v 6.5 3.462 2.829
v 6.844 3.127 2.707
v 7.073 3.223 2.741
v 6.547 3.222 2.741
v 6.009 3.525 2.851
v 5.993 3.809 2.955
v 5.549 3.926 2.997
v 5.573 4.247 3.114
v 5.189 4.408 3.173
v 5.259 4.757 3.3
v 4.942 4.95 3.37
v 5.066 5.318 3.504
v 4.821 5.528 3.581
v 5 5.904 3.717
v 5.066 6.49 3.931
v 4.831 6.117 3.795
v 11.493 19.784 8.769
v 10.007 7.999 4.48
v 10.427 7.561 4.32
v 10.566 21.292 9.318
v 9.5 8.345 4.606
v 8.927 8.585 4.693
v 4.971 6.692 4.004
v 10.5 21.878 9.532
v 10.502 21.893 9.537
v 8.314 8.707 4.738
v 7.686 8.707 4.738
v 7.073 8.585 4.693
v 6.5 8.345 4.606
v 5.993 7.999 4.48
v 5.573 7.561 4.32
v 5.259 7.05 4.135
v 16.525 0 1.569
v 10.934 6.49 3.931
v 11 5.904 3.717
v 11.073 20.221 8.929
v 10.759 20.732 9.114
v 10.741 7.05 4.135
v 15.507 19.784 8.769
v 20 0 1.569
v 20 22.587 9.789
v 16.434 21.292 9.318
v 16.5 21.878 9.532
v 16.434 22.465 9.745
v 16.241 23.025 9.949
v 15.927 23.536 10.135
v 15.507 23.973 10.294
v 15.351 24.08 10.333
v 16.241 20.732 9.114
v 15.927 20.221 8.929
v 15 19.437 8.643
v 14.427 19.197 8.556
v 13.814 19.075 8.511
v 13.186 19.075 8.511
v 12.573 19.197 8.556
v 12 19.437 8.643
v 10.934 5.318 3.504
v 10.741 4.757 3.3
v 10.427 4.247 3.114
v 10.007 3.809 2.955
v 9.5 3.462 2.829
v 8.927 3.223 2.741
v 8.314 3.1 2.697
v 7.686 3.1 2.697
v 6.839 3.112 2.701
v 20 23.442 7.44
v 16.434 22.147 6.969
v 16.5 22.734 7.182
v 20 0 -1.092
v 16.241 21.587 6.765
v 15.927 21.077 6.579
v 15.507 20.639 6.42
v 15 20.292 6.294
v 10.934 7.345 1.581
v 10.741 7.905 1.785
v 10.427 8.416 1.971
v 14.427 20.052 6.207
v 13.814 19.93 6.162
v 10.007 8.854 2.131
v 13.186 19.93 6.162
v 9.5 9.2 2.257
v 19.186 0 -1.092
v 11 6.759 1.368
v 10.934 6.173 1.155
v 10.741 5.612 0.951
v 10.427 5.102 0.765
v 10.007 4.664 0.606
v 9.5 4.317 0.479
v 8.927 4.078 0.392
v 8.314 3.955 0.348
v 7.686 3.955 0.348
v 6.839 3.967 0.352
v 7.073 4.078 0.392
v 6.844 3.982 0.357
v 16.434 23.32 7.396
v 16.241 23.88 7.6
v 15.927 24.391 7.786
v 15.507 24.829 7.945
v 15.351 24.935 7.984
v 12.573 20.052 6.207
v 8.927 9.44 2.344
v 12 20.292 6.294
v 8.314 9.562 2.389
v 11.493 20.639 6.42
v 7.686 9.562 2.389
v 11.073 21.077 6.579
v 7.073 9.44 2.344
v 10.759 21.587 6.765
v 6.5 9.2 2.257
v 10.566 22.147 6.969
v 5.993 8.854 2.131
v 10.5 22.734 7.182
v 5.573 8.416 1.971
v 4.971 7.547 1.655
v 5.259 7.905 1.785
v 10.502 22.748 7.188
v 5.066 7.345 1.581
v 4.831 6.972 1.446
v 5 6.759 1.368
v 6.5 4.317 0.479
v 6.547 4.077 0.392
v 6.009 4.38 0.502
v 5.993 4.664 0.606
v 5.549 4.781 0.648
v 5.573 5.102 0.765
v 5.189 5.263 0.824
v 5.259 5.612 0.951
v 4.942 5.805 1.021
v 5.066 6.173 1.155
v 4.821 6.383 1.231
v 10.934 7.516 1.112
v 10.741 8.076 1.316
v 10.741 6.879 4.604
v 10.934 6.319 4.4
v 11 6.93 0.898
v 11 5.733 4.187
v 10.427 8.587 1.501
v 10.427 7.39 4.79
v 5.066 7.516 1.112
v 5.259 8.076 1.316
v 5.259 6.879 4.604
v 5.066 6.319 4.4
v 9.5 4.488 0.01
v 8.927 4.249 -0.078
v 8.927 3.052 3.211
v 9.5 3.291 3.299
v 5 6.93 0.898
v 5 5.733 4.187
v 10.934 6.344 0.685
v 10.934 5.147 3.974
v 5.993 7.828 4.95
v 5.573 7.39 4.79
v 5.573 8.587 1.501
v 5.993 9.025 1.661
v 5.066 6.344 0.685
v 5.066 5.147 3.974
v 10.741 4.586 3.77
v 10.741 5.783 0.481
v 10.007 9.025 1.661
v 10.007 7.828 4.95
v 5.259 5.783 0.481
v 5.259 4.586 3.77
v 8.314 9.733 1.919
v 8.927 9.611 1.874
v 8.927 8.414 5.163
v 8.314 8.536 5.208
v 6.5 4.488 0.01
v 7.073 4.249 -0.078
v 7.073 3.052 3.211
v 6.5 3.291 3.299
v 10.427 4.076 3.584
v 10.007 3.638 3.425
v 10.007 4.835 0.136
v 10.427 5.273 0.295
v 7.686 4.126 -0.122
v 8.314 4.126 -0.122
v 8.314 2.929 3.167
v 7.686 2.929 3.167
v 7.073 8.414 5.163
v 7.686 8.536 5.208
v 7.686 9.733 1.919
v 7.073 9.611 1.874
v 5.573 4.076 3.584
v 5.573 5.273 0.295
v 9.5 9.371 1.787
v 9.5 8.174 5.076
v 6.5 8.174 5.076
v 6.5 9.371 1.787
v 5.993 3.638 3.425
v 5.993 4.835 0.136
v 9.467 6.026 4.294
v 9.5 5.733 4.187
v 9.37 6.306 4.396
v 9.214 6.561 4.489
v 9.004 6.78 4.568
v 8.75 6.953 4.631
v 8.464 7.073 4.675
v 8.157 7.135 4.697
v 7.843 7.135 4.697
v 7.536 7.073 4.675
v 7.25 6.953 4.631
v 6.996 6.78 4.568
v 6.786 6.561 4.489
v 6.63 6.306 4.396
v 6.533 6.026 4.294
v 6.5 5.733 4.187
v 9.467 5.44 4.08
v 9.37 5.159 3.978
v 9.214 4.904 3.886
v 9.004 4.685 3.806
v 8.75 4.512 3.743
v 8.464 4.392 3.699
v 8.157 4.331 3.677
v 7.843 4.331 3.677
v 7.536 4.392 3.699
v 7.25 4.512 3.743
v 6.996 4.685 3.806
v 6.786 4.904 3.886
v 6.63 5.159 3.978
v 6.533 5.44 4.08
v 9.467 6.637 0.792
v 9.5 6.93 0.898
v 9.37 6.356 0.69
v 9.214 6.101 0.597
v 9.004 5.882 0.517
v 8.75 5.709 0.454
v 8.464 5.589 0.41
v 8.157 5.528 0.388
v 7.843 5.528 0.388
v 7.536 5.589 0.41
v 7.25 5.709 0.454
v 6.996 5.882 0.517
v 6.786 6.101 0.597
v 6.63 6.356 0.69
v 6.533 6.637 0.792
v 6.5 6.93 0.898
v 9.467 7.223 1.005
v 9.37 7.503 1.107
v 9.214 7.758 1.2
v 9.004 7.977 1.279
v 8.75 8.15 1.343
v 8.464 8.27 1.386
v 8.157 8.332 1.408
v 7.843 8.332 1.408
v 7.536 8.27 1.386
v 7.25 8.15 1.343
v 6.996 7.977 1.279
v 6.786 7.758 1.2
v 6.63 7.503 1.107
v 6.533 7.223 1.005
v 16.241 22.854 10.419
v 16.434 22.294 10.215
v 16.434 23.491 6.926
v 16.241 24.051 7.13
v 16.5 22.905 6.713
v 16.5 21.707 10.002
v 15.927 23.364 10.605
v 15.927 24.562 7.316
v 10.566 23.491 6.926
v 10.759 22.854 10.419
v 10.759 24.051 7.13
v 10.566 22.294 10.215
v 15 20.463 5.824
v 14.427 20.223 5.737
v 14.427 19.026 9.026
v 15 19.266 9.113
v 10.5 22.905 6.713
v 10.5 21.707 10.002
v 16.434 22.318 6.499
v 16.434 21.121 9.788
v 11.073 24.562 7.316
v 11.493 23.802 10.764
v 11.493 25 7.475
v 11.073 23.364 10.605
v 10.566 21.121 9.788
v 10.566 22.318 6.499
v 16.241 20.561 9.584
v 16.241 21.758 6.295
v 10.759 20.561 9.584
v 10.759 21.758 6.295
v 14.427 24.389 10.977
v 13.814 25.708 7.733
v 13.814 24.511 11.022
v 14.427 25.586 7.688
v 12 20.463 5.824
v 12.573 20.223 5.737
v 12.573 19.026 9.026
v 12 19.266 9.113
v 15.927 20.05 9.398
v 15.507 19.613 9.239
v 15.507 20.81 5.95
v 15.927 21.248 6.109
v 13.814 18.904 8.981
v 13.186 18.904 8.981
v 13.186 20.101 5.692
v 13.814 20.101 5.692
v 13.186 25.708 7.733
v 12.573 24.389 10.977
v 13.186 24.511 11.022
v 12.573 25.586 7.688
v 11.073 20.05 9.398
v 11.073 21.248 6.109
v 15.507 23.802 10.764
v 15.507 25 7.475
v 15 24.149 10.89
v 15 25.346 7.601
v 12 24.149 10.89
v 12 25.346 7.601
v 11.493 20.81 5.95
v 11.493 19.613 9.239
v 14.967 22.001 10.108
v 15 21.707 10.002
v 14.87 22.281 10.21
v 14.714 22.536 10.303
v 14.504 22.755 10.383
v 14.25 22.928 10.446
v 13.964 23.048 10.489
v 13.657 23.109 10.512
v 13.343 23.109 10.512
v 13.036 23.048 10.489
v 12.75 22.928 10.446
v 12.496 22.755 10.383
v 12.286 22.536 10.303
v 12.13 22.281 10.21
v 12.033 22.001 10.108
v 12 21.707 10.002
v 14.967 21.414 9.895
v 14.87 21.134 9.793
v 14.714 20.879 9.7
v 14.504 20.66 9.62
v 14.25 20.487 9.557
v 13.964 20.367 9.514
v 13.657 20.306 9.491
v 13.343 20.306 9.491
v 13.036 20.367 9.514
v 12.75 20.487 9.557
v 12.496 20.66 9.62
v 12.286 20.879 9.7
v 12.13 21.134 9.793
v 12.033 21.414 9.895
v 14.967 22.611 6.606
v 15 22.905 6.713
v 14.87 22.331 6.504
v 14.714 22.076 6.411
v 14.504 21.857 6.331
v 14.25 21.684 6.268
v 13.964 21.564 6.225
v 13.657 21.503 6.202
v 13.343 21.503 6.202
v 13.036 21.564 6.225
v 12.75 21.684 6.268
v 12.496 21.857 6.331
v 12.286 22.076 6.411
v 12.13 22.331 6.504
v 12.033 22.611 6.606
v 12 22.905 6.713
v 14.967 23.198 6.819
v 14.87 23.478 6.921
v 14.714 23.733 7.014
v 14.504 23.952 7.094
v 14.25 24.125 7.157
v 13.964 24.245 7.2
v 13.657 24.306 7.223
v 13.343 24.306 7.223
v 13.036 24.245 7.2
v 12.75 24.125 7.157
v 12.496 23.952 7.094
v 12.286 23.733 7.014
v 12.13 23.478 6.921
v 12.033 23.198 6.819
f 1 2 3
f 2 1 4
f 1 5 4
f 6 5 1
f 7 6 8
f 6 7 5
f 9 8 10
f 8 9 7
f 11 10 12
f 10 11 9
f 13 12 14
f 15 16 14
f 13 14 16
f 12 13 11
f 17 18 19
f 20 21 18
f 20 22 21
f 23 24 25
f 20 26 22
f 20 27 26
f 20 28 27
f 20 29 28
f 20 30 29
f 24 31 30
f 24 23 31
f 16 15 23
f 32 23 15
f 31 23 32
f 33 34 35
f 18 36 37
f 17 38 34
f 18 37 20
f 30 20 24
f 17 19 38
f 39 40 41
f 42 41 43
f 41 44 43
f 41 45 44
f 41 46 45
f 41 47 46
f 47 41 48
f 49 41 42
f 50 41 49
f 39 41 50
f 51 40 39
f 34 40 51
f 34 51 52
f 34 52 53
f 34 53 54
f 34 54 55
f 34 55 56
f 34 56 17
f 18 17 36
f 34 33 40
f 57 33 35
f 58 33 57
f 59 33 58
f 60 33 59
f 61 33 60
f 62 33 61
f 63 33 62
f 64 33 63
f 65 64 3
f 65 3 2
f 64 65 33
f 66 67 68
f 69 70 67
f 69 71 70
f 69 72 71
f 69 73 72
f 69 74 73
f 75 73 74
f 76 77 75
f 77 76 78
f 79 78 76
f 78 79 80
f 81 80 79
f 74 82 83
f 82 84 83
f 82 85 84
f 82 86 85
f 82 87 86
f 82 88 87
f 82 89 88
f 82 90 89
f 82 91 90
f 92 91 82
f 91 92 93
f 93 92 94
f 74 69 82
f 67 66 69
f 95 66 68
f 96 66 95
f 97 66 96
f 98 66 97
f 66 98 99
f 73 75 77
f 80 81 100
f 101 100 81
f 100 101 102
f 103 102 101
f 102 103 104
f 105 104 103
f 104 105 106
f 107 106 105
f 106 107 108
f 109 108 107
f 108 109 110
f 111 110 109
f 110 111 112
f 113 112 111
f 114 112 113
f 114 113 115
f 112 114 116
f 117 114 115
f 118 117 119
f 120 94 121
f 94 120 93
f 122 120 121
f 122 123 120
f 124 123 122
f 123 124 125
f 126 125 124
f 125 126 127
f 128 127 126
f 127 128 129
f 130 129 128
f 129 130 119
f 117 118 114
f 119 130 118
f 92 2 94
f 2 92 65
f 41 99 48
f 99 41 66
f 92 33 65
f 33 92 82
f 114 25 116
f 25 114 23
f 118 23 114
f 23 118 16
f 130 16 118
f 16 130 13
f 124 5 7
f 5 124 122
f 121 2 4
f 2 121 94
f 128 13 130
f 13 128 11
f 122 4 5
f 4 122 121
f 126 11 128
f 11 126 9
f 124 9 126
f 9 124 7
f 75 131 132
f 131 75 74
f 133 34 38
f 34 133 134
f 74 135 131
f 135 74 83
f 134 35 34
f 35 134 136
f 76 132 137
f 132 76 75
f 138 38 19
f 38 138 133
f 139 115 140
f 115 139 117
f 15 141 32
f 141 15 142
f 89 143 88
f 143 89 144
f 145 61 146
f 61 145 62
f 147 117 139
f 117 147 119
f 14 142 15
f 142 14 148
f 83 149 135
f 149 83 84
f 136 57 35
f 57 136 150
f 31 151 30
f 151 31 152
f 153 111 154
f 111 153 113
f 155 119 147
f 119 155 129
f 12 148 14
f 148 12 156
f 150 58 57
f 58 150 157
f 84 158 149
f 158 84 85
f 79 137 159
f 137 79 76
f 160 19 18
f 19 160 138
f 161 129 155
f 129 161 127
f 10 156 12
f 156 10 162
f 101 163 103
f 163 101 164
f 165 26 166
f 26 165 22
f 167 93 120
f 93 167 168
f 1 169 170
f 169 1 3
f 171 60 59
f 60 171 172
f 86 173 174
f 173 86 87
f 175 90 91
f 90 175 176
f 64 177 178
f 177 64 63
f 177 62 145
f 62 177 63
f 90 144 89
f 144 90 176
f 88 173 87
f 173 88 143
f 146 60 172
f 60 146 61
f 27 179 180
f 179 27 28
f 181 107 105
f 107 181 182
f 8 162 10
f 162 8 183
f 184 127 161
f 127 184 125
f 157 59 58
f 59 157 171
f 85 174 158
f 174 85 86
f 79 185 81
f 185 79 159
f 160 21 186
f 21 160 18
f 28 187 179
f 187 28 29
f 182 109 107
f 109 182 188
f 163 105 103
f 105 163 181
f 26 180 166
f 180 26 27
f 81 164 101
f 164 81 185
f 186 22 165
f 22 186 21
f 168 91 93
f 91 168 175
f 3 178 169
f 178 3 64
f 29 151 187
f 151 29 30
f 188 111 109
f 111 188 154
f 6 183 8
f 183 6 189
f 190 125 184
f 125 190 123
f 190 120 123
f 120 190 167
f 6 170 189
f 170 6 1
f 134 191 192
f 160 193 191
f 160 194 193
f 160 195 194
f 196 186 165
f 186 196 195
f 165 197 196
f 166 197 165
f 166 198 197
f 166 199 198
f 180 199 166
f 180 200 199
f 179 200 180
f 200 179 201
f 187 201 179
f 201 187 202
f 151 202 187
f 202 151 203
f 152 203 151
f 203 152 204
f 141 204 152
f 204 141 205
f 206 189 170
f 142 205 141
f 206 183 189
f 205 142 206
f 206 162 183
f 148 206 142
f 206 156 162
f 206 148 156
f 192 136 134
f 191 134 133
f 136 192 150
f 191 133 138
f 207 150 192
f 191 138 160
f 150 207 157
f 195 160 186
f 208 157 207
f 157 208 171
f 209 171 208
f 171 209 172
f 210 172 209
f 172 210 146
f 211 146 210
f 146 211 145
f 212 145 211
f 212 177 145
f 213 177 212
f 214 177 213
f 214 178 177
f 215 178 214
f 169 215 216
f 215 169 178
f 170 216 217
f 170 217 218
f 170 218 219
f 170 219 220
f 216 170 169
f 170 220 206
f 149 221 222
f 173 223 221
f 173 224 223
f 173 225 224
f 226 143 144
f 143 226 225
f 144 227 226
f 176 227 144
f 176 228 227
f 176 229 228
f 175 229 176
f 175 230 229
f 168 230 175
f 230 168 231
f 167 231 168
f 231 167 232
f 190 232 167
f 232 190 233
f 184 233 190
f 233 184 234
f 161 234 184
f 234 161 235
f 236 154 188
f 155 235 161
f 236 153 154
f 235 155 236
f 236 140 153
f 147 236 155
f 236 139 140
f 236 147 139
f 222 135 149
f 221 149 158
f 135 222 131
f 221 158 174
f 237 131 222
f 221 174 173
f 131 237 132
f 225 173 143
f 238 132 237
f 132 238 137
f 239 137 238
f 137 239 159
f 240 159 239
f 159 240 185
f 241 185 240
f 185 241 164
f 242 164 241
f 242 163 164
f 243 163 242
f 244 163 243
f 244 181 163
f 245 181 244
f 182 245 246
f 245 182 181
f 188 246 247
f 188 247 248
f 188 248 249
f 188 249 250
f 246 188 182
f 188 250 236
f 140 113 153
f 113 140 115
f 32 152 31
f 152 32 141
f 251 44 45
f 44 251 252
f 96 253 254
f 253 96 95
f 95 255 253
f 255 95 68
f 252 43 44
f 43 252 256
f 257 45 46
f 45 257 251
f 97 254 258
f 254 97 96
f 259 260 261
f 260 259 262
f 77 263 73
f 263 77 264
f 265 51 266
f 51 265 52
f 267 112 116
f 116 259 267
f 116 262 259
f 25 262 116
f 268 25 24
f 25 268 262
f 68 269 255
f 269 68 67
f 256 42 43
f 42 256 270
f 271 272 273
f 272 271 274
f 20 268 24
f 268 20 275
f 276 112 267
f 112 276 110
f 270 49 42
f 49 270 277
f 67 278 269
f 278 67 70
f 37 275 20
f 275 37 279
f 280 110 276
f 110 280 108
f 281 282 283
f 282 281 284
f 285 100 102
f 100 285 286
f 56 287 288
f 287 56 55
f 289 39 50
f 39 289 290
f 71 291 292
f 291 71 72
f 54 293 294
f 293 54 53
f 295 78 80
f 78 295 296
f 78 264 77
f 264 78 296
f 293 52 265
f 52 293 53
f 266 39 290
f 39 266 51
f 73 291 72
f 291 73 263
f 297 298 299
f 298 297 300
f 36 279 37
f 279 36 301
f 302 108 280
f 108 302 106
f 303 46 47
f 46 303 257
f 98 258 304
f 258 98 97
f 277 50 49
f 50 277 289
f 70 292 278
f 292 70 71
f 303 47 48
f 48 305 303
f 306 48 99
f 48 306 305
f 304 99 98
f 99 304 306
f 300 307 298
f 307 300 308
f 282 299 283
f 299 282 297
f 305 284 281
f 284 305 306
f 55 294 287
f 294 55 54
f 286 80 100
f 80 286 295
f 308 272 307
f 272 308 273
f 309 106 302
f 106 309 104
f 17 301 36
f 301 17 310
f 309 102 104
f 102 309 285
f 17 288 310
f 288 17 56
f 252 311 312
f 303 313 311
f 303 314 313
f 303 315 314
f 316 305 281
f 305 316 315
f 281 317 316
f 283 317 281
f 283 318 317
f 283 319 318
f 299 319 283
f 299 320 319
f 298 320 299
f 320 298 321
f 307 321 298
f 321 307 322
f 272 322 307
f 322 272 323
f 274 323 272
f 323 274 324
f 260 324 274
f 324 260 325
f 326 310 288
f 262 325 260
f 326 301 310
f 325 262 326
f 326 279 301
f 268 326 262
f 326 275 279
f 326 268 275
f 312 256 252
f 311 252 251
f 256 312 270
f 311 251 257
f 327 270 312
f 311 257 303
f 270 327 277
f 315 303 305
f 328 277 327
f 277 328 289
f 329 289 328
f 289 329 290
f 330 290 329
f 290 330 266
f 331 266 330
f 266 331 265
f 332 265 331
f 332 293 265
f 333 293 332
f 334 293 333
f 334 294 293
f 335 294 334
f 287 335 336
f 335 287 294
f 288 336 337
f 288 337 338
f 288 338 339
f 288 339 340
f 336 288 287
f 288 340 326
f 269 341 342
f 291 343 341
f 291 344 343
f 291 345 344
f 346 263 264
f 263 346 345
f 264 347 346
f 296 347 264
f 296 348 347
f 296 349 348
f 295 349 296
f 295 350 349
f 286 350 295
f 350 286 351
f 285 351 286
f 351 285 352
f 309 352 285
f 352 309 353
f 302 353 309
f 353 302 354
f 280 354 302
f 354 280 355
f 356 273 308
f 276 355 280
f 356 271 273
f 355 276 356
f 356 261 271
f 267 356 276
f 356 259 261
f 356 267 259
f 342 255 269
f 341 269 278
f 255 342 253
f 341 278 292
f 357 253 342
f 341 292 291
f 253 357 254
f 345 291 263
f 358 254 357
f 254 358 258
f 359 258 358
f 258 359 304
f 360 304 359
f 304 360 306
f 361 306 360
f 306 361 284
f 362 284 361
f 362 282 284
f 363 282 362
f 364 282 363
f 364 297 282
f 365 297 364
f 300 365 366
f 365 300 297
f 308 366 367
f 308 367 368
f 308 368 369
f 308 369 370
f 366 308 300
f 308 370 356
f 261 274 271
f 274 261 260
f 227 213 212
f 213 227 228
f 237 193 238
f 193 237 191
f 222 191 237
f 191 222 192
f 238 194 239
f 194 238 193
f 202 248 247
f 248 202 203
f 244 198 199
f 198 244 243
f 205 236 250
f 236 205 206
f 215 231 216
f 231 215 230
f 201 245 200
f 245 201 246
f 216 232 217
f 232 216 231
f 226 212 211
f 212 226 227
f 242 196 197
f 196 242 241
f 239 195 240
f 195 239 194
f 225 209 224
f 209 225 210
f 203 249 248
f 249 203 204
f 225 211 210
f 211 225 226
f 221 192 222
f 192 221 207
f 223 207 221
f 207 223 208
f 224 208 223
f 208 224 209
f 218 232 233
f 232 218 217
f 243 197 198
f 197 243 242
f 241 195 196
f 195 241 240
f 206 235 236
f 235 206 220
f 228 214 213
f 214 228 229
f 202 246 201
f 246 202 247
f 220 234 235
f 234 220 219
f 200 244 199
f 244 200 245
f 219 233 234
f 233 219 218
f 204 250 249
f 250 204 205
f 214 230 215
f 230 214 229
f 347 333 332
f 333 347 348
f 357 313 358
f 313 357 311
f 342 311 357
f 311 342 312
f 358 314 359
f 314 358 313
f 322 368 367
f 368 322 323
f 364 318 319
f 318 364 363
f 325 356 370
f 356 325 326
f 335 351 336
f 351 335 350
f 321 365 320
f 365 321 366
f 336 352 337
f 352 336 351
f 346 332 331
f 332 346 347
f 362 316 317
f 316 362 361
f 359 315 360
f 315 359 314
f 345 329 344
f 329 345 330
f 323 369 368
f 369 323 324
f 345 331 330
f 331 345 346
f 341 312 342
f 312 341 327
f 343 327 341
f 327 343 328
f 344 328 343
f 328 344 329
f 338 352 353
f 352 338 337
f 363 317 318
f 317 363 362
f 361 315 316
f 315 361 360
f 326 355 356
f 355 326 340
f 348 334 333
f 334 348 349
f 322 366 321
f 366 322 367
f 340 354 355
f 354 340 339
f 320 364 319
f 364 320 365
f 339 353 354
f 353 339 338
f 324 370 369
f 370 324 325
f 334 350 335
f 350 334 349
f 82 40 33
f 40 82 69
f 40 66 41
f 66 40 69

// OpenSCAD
pena = 10;
vrstva = 3;
rameno = 23;
kostka = 60;
alfa=15;

$fn=30;
//tiskBool = false;
tiskBool = true;

//Kleste();
//Redukce();

//KlestePrava();
//Simul();

//Print4();

//Print5();


module tisk()
{
    
    translate([0,45,0]) rotate([-90,0,0]) KlesteLeva();
    translate([0,0,0]) rotate([90,0,0]) KlestePrava(); 
    
}
//tisk();

module Print4()
{
    difference()
    {
    translate([0,0,00]) rotate([0,270,0]) 
    {
 KlesteLeva();
translate([0,-40,0]) KlestePrava(); 
    } 
    translate([-50,-70,-128]) cube(100);
    } 
}


module Print5()
{
    difference()
    {
    translate([0,0,22]) rotate([0,0,0])
    {
        translate([0,0,0]) rotate([-90,0,0]) KlesteLeva();
        translate([0,-40,0]) rotate([90,0,0]) KlestePrava(); 
    } 
   translate([-100,-100,-200]) cube(200); 
}
}

//Print2();


module Print2()
{
    translate([0,0,0]) rotate([0,0,0])
    {
        KlesteLeva();
        translate([0,-40,0]) KlestePrava(); 
    }  
}


//Print();


module Print()
{
    translate([0,0,35]) rotate([0,160,0])
    {
        KlesteLeva();
        translate([0,-40,0]) KlestePrava(); 
    }  
}


module Simul()
{
    //i = 0;
    i = $t;
    kk = alfa+i*rameno;
    translate([0,kk,40]) KlesteLeva();
    //translate([0,-30-$t*2*rameno,0]) KlestePrava();  
   translate([0,-kk,40]) KlestePrava();   
    //translate([11,-52,-20])rotate([0,0,45])  cube(40);
    //translate([23,-62,-20])rotate([0,0,45])  cube(40);
    translate([0,-kostka/2,0]) color("black",0.5) cube(kostka);    
}

posun = 30;
module KlesteLeva()
{   difference()
   { 
    translate([0,0,0])
        {
        translate([-28+posun,-2,42]) rotate([0,20,0])
            { 
                rotate([0,0,-20]) Redukce();

            }
            mirror([0,1,0])translate([0,0,0]) Kleste();
            
        }
        translate([0,alfa ,0]) cube(100);
    }
}


module KlestePrava()
{    
    difference()
    {
        translate([0,0,0])
        {
            translate([-28+posun,2,42]) rotate([0,20,0])
            {
                rotate([180,0,20]) Redukce();
            }
            translate([0,0,0]) Kleste(); 
        }   
        translate([0,-alfa-100 ,0]) cube(100);
    }
}


module plocha(rozd)
{
    mezera = 2.5;
    odx = 10;
    odxS = (rozd[0]-odx*3)/4;
    odxSO = odxS + 3;
    odz = 10;
    odzS = 10;
    odzSO = odzS + 3;
    difference()
    {
        OvalnaKrichleY(rozd,2);
        //pro osu y
        for(x = [mezera:mezera:rozd[0] - mezera])
        {
            translate([x,rozd[1]*2,rozd[2]-mezera]) rotate([90,0,0]) cylinder(h = 100,d = 1);
            translate([x,rozd[1]*2,mezera]) rotate([90,0,0]) cylinder(h = 100,d = 1);
        }
        for(z = [mezera:mezera:rozd[2] - mezera])
        {
            translate([rozd[0]-mezera,rozd[1]*2,z]) rotate([90,0,0]) cylinder(h = 100,d = 1);
            translate([mezera,rozd[1]*2,z]) rotate([90,0,0]) cylinder(h = 100,d = 1);
        }
        
        for(x = [odx:odxSO:rozd[0] - odx])
        {
            for(z = [odz:odzSO:rozd[2] - odz])
            {
                translate([x,-10,z]) OvalnaKrichleY([odxS,100, odzS],2);
                
            }
            
        }
    }
    
    
}

module Kleste()
{

    v = pena + vrstva;
    vyskaCenter = 20;
    vyskaPlochy = 40;
    sirkaPlochy = 60;
    rezer = 10;
    odstup = sirkaPlochy + 40;

    //translate([j+j+bb/2-2,-v,0]) rotate([0,-90,0]) cylinder(h=bb+3*j,d=bb,center = false);

    
    //translate([0,-v,-4])  cylinder(h=40,d=10,center = false);
    translate([0,alfa,0]) 
    {
        //rotate([90,0,0]) cylinder(h=alfa+v,d=10,center = false);
        translate([0,-(kostka/2-rameno + pena+ vrstva + rezer),0]) {
            translate([0,0,vyskaCenter-vyskaPlochy])
            {
            
                plocha([sirkaPlochy ,vrstva,vyskaPlochy]);
                if(tiskBool == false)
                {
                    
                    translate([0,+ vrstva,0]) color("red",0.5) cube([sirkaPlochy ,pena,vyskaPlochy]);
                }
            }
            translate([0,0,vyskaCenter])
            {
                translate([0,vrstva/2,0]) rotate([0,90,0]) cylinder(h = odstup,d = vrstva);
                translate([odstup, vrstva/2,0 ]) 
                {
                   translate([0,0,0]) cylinder(h = 30,d = vrstva);
                   translate([0,0,0]) rotate([0,90,0]) cylinder(h = 20,d = vrstva);
                    translate([20,0,0]) intersection()
                    {
                        delkaPredHaku = 15;
                        vyskaPredHaku = 15;
                        rotate([0,90,0]) cylinder(h = delkaPredHaku, r1 = vyskaPredHaku, r2=0);
                        translate([0,-vrstva/2,-vrstva/2])cube([delkaPredHaku, vrstva, vyskaPredHaku + vrstva]);
                    }
                }
                vyskaPPP = 22;
               translate([posun -25,0,0]) OvalnaKrichleY([35,vrstva, vyskaPPP]); 
                translate([posun -15,0,0]) cube([vrstva, 10,vyskaPPP]);
                translate([posun ,0,0]) cube([vrstva, 20,vyskaPPP]);
                difference()
                {
                translate([0,0,0])cube([odstup,kostka/2-rameno + pena+ vrstva + rezer, vrstva]);
                    translate([odstup,0,0]) rotate([0,0,40]) cube(100);
                    translate([8,20,00]) rotate([0,0,00])  OvalnaKrichleZ([12,12,12],2);
                    for(x = [30:3:74])
                    {
                        translate([x,kostka/2-rameno + pena+ vrstva + rezer,0]) cylinder(h = 100, d = 2.3);
                        
                    }
                    translate([45,kostka/2-rameno + pena+ vrstva + rezer-10,0]) cylinder(h = 100, d = 3);
                    translate([65,kostka/2-rameno + pena+ vrstva + rezer-10,0]) cylinder(h = 100, d = 3);
                }
            }
            
        }
        
        
    }
}


module Redukce()
{
    translate([0,0,-2.5/2]) difference()
    {
        union()
        {
            translate([3,0,0]) cylinder(h=2.5+1,d=6,center=false,$fn=64);
            translate([3,0,-1]) cylinder(h=1,d=5,center=false,$fn=64);   
            translate([0,-3,0]) cube([30,40,2.5]);
            translate([20,0,-0.5]) cylinder(h=3.5,d=6,center=false,$fn=64);
            translate([20,0,-1]) cylinder(h=4.5,d=5,center=false,$fn=64);
        }
        translate([3,0,-1.5]) cylinder(h=10,d=3,center=false,$fn=64);
        translate([20,0,-1.5]) cylinder(h=10,d=3,center=false,$fn=64);   
    }
}
RedukBeta();

module RedukBeta( naklon = 20, OddalY = 3, hranX = 20 )
{
    difference()
    {
        translate([0,OddalY,0]) rotate([naklon,0,0]) difference()
        {
            vyskaPolstarku = 1.5;
            prumVyrezDer = 3;
            z_pods = 0;
            dira1 = [5+prumVyrezDer/2 + vyskaPolstarku, 2.5+prumVyrezDer/2,z_pods ];
            dira2 = [10.5+prumVyrezDer/2 + vyskaPolstarku, 19.5+prumVyrezDer/2,z_pods ];
            rozdDer = dira1 - dira2;
            uhel = -asin(rozdDer[0]/rozdDer[1]);
            vyskaDesky = 2.5;
            prumObjimMax = 6;
            vystMax = 0.5;
            delkaPodUhlem = sqrt(rozdDer[0]*rozdDer[0] + rozdDer[1]*rozdDer[1]) + prumObjimMax;
            
            
            translate([0,0,0])
            {
                translate([dira1[0]  - prumObjimMax/1.5 ,dira1[1] - prumObjimMax/3,0])rotate([0,0,uhel]) OvalnaKrichleZ([25,delkaPodUhlem,vyskaDesky],prumVyrezDer);
                echo(rozdDer);
                echo(uhel);
                translate([0,0,-0.5])
                {
                translate(dira1) cylinder(h = vystMax*2+ vyskaDesky , d = prumObjimMax);
                translate(dira2) cylinder(h = vystMax*2+ vyskaDesky , d = prumObjimMax);
                }
            }

            translate([0,0,-50])
            {
                translate(dira1) cylinder(h = 100 , d = prumVyrezDer);
                translate(dira2) cylinder(h = 100 , d = prumVyrezDer);
            }
            
        }
        translate([0,-100,-50]) cube(100);
        translate([hranX,0,-50]) cube(100);
    }
    
}

//Kód pro vytvoření oválných kvádrů
module OvalnaKrichleX(Rozdmery, zakulaceni = 1,st = 30)
{
	union() {
	translate([0,zakulaceni,0]) cube([Rozdmery[0],Rozdmery[1] - zakulaceni * 2,Rozdmery[2]],center=false);
	translate([0,0,zakulaceni]) cube([Rozdmery[0],Rozdmery[1],Rozdmery[2] - zakulaceni * 2],center=false);
	translate([0,zakulaceni,zakulaceni]) rotate([0,90,0]) cylinder( Rozdmery[0],   zakulaceni, zakulaceni,false,$fn=st);
	translate([0,Rozdmery[1] - zakulaceni,zakulaceni]) rotate([0,90,0]) cylinder( Rozdmery[0],   zakulaceni, zakulaceni,false,$fn=st);
	translate([0,zakulaceni,Rozdmery[2] - zakulaceni]) rotate([0,90,0]) cylinder( Rozdmery[0],   zakulaceni, zakulaceni,false,$fn=st);
	translate([0,Rozdmery[1] - zakulaceni,Rozdmery[2] - zakulaceni]) rotate([0,90,0]) cylinder( Rozdmery[0],   zakulaceni, zakulaceni,false,$fn=st);
	}
}


module OvalnaKrichleY(Rozdmery, zakulaceni = 1,st = 30)
{
	union() {
	translate([zakulaceni,0,0]) cube([Rozdmery[0] - zakulaceni * 2,Rozdmery[1],Rozdmery[2]],center=false);
	translate([0,0,zakulaceni]) cube([Rozdmery[0],Rozdmery[1],Rozdmery[2] - zakulaceni * 2],center=false);
	translate([zakulaceni,0,zakulaceni]) rotate([270,0,0]) cylinder( Rozdmery[1],   zakulaceni, zakulaceni,false,$fn=st);
	translate([Rozdmery[0] - zakulaceni,0,zakulaceni]) rotate([270,0,0]) cylinder( Rozdmery[1],   zakulaceni, zakulaceni,false,$fn=st);
	translate([zakulaceni,0,Rozdmery[2] - zakulaceni]) rotate([270,0,0]) cylinder( Rozdmery[1],   zakulaceni, zakulaceni,false,$fn=st);
	translate([Rozdmery[0] - zakulaceni,0,Rozdmery[2] - zakulaceni]) rotate([270,0,0]) cylinder( Rozdmery[1],   zakulaceni, zakulaceni,false,$fn=st);
	}
}


module OvalnaKrichleZ(Rozdmery, zakulaceni = 1,st = 30)
{
	union() {
	translate([zakulaceni,0,0]) cube([Rozdmery[0] - zakulaceni * 2,Rozdmery[1],Rozdmery[2]],center=false);
	translate([0,zakulaceni,0]) cube([Rozdmery[0],Rozdmery[1]  - zakulaceni * 2,Rozdmery[2]],center=false);
	translate([zakulaceni,zakulaceni,0]) rotate([0,0,0]) cylinder( Rozdmery[2],   zakulaceni, zakulaceni,false,$fn=st);
	translate([Rozdmery[0] - zakulaceni,zakulaceni,0]) rotate([0,0,0]) cylinder( Rozdmery[2],   zakulaceni, zakulaceni,false,$fn=st);
	translate([zakulaceni,Rozdmery[1] - zakulaceni,0]) rotate([0,0,0]) cylinder( Rozdmery[2],   zakulaceni, zakulaceni,false,$fn=st);
	translate([Rozdmery[0] - zakulaceni,Rozdmery[1] - zakulaceni,0]) rotate([0,0,0]) cylinder( Rozdmery[2],   zakulaceni, zakulaceni,false,$fn=st);
	}
}


module OvalnaKrichle(Rozdmery, zakulaceni, osaX, osaY, osaZ, st = 10)
{
	cont = false;
	intersection()
	{
		if(osaX == true)
		{
			OvalnaKrichleX(Rozdmery,zakulaceni,st);
			cont = true;
		}
		if(osaY == true)
		{
			OvalnaKrichleY(Rozdmery,zakulaceni,st);
			cont = true;
		}
		if(osaZ == true)
		{
			OvalnaKrichleZ(Rozdmery,zakulaceni,st);
			cont = true;
		}
		if(cont == false)
		{
			cube(Rozdmery,center=false);
		}
	}
}


module OvalnaKrichleCisla(Rozdmery, osaX, osaY, osaZ ,st = 10 )
{
	cont = false;
	intersection()
	{
		if(osaX != 0)
		{
			OvalnaKrichleX(Rozdmery,osaX,st);
			cont = true;
		}
		if(osaY != 0)
		{
			OvalnaKrichleY(Rozdmery,osaY,st);
			cont = true;
		}
		if(osaZ != 0)
		{
			OvalnaKrichleZ(Rozdmery,osaZ,st);
			cont = true;
		}
		if(cont == false)
		{
			cube(Rozdmery,center=false);
		}
	}
}
